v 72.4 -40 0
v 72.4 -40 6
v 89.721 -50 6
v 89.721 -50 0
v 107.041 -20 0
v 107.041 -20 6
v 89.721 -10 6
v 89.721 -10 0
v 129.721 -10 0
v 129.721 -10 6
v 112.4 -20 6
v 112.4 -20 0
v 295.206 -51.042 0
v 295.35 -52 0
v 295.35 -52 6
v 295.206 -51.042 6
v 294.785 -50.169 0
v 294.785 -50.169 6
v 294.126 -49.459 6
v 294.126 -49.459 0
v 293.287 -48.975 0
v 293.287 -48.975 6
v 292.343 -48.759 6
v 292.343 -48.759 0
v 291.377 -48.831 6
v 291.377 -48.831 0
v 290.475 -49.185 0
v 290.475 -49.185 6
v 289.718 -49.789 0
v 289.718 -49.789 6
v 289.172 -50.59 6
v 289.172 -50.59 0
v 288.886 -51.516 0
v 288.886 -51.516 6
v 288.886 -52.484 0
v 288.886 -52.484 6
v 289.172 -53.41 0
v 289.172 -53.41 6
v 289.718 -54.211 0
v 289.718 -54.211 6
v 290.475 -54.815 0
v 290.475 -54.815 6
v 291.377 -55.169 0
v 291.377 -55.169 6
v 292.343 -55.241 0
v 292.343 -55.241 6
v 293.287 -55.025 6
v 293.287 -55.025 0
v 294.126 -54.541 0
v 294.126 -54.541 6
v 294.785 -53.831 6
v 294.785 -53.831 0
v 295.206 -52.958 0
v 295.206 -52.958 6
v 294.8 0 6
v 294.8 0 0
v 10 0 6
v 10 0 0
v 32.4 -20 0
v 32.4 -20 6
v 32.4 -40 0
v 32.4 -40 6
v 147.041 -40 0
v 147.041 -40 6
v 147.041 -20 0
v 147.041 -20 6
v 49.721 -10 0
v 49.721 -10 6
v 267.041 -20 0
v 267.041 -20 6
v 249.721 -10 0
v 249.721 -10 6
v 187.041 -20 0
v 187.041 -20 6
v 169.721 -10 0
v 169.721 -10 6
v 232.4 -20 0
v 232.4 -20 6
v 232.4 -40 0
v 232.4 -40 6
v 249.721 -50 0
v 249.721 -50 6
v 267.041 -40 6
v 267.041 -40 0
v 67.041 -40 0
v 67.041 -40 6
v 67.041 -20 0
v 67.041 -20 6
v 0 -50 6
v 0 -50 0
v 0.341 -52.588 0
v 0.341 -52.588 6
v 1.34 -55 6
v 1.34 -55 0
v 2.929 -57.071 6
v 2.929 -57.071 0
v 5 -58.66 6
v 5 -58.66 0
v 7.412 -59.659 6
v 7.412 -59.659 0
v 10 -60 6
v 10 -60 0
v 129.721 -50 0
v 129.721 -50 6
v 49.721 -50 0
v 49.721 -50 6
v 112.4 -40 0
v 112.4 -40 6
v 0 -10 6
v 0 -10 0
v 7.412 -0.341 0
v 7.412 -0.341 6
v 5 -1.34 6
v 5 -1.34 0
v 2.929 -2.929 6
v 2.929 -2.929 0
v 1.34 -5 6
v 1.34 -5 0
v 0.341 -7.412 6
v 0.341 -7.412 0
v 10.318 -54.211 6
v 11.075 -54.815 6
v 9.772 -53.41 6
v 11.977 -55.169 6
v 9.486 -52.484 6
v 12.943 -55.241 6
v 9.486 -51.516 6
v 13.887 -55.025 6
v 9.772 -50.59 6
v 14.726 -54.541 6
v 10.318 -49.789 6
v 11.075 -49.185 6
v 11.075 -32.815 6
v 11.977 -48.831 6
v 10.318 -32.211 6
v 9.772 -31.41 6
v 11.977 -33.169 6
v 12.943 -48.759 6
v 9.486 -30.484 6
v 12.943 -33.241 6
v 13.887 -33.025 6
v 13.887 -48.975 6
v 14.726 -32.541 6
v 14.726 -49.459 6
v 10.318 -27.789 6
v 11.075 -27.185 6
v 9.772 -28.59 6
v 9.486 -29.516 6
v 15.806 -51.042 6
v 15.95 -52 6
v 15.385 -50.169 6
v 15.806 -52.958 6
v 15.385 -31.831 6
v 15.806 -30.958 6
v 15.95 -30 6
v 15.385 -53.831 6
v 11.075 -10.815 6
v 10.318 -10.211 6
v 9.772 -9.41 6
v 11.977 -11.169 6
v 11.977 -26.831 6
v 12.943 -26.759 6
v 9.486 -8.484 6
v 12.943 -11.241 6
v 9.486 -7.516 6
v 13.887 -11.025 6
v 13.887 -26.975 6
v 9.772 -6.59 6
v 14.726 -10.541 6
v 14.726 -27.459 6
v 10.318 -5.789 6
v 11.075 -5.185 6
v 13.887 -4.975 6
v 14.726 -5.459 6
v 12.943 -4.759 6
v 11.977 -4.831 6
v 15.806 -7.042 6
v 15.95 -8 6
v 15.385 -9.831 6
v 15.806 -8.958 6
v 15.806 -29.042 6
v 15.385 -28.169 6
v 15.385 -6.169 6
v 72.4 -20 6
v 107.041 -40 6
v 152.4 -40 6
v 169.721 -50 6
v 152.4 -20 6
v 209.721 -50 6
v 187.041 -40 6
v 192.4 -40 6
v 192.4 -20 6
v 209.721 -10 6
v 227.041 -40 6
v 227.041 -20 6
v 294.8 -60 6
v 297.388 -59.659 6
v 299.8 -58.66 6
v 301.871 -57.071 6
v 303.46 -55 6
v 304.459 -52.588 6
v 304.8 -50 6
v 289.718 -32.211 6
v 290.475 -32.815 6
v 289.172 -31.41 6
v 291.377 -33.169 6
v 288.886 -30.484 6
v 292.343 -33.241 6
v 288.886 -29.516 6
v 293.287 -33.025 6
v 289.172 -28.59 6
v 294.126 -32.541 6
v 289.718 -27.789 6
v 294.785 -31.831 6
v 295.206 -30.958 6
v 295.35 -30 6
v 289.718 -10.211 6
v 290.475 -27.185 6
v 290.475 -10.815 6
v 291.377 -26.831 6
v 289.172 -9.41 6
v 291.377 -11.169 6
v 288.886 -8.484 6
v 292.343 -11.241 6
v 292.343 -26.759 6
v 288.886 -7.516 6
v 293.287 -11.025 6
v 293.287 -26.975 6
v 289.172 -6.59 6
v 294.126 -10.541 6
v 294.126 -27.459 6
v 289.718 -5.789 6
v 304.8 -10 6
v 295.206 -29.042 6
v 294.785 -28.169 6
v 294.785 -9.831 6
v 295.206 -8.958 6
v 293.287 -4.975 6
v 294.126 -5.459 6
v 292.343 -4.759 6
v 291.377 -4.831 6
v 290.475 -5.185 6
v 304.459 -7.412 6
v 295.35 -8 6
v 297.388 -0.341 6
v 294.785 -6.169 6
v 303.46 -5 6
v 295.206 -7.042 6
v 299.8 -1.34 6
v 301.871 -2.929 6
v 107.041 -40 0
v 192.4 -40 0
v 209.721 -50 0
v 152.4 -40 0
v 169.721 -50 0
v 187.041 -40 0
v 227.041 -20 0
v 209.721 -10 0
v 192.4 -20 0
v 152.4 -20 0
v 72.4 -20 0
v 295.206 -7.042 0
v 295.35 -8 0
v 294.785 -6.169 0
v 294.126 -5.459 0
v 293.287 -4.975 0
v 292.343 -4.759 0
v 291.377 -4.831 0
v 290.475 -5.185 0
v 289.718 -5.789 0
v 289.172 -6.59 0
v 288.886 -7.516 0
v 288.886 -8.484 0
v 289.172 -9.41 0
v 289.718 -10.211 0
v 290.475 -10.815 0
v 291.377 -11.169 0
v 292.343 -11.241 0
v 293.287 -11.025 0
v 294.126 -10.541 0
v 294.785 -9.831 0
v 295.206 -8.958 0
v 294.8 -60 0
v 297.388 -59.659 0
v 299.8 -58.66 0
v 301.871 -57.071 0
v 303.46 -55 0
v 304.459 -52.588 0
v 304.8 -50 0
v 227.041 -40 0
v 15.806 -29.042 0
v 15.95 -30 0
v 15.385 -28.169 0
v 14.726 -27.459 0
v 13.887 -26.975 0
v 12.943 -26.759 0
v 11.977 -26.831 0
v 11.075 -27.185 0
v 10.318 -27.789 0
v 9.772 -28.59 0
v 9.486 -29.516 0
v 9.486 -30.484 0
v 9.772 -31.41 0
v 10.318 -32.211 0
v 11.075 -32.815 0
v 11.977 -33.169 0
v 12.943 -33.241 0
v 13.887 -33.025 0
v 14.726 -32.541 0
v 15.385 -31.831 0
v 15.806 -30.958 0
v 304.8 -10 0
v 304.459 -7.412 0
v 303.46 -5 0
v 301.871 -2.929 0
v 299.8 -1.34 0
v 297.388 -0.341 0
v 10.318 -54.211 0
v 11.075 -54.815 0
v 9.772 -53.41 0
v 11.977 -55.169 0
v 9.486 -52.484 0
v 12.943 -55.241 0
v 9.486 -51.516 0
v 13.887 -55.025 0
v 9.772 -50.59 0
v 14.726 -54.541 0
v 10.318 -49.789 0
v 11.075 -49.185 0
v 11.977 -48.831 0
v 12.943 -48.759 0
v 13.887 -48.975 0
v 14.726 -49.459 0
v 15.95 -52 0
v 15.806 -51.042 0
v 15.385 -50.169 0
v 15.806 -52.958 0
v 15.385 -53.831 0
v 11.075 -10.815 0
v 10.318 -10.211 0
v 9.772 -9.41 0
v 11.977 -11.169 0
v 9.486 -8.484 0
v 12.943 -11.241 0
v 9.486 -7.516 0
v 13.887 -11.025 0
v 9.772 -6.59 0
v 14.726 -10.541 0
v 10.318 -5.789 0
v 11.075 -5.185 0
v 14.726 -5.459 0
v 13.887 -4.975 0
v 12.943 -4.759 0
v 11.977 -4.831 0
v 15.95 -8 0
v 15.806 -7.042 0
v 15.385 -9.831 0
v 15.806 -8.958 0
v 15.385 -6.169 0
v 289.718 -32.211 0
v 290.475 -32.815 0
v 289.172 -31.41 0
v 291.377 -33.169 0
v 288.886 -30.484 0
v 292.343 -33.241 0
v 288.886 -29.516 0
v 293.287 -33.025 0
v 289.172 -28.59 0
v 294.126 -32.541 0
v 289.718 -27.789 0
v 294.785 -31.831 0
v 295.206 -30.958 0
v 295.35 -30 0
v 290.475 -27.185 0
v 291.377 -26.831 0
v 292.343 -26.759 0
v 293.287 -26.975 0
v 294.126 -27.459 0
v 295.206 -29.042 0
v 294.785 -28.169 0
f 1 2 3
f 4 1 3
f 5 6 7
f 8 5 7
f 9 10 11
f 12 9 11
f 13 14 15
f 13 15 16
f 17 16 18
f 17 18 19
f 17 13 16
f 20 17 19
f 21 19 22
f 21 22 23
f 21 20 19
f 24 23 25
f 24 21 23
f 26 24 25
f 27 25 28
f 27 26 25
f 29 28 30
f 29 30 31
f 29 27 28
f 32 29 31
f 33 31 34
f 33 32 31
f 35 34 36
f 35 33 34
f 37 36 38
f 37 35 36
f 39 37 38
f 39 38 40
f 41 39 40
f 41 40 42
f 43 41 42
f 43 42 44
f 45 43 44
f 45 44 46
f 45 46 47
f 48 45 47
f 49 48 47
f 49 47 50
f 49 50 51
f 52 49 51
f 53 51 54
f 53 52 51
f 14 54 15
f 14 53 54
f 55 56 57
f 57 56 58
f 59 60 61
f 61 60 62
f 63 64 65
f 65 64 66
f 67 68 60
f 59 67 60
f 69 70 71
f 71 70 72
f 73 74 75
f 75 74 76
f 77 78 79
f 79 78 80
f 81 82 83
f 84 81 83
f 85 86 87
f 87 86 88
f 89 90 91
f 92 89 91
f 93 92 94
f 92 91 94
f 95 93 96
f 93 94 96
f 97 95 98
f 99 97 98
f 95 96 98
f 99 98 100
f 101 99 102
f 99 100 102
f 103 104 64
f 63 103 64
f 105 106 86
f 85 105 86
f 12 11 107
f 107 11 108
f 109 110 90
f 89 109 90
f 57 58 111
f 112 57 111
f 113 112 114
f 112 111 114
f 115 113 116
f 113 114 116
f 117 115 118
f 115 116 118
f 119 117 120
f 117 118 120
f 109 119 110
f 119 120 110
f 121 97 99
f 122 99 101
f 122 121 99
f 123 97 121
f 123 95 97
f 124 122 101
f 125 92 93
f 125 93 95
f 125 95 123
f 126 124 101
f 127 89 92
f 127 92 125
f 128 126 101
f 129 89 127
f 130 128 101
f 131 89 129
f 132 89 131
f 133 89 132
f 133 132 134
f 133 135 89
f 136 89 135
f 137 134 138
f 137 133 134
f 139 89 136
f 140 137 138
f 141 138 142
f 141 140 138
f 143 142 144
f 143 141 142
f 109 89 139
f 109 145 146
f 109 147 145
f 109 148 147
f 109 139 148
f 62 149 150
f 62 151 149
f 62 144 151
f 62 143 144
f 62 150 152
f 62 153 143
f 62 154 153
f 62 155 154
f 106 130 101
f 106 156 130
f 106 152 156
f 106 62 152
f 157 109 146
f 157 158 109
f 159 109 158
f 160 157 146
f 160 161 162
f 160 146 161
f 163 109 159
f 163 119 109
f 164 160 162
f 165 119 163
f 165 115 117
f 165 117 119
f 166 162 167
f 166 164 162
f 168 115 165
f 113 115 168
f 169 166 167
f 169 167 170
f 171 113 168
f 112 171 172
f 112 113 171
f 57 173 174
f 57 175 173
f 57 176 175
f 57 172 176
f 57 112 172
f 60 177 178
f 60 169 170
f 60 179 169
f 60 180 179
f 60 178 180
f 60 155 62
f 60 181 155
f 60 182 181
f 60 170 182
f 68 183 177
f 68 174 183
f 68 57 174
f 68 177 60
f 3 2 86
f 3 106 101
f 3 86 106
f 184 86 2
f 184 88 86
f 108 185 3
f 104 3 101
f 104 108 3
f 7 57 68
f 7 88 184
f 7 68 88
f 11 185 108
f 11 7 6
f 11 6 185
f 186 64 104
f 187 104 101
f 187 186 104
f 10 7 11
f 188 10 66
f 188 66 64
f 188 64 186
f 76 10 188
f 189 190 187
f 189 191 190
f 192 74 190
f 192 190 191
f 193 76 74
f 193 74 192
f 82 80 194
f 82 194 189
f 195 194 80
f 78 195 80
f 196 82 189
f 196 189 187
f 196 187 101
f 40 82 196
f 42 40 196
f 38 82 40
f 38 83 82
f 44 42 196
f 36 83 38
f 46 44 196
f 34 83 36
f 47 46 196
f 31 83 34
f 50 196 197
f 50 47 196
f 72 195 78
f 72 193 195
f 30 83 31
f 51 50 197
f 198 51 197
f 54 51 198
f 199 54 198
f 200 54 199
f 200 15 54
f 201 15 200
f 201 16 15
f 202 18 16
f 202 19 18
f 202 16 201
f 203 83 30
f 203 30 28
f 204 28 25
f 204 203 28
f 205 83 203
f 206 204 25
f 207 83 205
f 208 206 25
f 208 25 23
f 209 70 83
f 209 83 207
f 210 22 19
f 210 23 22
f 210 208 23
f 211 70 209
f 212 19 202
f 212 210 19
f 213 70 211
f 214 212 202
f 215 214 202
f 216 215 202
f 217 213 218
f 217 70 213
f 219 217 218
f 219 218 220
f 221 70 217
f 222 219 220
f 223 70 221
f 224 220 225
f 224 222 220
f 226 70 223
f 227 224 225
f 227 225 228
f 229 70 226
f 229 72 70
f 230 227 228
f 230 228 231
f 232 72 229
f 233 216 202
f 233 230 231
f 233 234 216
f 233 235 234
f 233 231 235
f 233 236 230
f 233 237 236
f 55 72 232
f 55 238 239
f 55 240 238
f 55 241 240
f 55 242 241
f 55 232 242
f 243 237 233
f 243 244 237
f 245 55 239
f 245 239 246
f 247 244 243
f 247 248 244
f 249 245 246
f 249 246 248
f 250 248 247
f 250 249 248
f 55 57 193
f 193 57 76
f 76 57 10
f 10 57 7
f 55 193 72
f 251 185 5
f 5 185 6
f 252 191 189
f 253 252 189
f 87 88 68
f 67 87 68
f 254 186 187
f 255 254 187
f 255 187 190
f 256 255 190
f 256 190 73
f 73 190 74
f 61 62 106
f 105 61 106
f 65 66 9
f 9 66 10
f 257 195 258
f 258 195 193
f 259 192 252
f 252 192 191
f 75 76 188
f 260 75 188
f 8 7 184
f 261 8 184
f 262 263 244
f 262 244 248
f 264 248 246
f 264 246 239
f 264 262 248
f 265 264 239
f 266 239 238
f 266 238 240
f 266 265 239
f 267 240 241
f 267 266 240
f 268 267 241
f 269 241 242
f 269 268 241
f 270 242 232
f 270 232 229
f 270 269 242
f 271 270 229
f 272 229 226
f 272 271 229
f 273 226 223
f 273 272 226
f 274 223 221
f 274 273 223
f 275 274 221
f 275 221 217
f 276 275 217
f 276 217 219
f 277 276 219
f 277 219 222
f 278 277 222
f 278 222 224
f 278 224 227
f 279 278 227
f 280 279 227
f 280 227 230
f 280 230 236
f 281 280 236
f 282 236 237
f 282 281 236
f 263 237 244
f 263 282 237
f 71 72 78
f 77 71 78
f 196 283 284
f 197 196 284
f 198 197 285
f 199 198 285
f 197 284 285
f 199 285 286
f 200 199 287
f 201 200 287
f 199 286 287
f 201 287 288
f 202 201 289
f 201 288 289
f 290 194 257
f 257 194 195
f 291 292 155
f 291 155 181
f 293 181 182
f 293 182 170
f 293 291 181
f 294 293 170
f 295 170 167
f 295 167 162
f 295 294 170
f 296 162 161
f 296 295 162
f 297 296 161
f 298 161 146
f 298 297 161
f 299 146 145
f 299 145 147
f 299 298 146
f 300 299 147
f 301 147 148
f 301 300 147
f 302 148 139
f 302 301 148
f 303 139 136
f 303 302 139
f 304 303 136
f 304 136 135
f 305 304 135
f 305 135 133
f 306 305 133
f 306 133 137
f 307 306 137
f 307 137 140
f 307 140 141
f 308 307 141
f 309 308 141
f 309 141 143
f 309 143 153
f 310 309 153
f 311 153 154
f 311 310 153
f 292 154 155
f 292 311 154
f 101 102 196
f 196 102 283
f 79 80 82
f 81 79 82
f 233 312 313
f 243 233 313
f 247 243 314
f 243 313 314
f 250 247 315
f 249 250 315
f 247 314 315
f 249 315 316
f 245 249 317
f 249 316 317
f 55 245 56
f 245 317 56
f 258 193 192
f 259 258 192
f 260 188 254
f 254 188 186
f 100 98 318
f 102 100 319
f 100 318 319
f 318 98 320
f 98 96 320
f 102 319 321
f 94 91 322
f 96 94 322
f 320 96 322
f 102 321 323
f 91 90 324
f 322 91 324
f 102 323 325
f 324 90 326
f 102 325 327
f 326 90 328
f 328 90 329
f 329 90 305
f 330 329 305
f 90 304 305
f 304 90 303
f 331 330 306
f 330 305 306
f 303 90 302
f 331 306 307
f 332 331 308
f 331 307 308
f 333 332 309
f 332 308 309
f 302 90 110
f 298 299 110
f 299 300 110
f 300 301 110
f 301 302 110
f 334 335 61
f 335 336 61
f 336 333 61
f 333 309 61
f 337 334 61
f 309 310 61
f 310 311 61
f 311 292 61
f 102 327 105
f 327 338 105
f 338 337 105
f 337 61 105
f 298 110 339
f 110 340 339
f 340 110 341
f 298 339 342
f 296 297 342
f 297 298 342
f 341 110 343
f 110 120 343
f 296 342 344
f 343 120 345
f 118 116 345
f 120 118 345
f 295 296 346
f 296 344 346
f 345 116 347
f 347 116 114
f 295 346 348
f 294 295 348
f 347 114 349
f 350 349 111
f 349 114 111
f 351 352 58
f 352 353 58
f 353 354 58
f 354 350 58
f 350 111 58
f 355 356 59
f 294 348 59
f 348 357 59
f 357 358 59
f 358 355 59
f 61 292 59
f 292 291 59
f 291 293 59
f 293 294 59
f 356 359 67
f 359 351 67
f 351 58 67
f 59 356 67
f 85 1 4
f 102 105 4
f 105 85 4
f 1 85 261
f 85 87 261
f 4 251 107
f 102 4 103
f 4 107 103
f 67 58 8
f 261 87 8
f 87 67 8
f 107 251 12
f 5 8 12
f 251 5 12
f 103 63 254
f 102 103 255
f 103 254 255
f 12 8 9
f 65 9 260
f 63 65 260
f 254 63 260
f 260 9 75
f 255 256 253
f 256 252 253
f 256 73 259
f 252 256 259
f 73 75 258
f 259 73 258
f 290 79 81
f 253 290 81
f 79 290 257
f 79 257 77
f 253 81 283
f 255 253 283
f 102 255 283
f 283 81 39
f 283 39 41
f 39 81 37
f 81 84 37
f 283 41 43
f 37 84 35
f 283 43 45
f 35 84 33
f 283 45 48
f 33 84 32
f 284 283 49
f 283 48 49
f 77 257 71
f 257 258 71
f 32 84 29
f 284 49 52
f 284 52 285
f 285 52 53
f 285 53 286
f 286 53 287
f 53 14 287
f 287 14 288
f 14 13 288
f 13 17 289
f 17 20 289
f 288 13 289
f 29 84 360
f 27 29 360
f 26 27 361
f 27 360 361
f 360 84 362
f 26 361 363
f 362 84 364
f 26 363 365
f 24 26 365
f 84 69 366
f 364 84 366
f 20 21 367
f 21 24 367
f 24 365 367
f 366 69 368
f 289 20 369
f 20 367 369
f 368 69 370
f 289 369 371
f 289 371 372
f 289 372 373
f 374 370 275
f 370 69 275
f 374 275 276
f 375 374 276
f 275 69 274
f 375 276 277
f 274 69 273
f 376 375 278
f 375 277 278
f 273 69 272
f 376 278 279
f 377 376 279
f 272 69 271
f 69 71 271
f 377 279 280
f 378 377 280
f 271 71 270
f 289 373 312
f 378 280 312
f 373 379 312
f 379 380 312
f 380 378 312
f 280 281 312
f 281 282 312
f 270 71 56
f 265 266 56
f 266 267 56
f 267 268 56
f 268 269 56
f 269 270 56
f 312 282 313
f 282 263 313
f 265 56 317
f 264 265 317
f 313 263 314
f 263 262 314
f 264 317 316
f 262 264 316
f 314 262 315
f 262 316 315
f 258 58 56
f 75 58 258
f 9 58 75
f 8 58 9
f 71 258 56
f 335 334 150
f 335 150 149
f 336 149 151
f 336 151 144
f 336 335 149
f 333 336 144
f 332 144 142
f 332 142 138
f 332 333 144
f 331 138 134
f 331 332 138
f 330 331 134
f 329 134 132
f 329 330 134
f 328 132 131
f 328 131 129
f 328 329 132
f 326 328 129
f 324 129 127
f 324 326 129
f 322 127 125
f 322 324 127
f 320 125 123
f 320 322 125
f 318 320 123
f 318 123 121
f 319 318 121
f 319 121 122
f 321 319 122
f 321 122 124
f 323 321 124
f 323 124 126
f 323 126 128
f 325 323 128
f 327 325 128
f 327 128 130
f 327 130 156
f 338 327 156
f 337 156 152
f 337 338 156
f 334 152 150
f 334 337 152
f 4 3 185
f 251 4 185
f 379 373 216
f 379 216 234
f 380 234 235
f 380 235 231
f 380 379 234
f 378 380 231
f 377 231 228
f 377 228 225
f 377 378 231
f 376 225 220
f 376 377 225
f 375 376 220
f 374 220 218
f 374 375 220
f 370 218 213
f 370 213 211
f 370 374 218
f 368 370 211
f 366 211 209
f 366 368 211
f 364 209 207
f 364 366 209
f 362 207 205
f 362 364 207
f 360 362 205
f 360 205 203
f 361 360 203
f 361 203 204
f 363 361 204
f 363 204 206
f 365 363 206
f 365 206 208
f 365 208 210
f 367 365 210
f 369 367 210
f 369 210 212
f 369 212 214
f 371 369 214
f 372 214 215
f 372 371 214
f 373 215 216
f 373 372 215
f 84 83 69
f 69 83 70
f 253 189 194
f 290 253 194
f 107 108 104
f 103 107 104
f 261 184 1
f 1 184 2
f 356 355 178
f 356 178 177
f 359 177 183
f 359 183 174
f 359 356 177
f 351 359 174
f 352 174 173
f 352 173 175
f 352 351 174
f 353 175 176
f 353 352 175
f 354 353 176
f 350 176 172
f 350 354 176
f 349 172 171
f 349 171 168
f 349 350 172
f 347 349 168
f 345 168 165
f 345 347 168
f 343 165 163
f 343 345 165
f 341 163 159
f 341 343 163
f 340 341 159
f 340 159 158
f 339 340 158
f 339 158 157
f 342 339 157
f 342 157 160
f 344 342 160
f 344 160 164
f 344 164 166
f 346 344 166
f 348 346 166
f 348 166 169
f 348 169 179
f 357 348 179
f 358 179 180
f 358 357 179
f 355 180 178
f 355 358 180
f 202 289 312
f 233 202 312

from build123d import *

# Parameters (mm, degrees)
SKETCH001_R  = 3.25
PAD_DEPTH    = 6
POCKET_DEPTH = 6


with BuildPart() as part:
    # Sketch001 → Pad (new body)
    with BuildSketch(Plane.XY):
        with BuildLine():
            Line((0, -10), (0, -50))
            ThreePointArc((0, -50), (2.928932, -57.071068), (10, -60))
            Line((10, -60), (294.8, -60))
            ThreePointArc((294.8, -60), (301.871068, -57.071068), (304.8, -50))
            Line((304.8, -50), (304.8, -10))
            ThreePointArc((304.8, -10), (301.871068, -2.928932), (294.8, 0))
            Line((294.8, 0), (10, 0))
            ThreePointArc((10, 0), (2.928932, -2.928932), (0, -10))
        make_face()
        with Locations((292.1, -8)):
            Circle(SKETCH001_R, mode=Mode.SUBTRACT)
        with Locations((292.1, -52)):
            Circle(SKETCH001_R, mode=Mode.SUBTRACT)
        with Locations((292.1, -30)):
            Circle(SKETCH001_R, mode=Mode.SUBTRACT)
        with Locations((12.7, -8)):
            Circle(SKETCH001_R, mode=Mode.SUBTRACT)
        with Locations((12.7, -52)):
            Circle(SKETCH001_R, mode=Mode.SUBTRACT)
        with Locations((12.7, -30)):
            Circle(SKETCH001_R, mode=Mode.SUBTRACT)
    extrude(amount=PAD_DEPTH)

    # Sketch (on Face16 of Pad) → Pocket (cut)
    with BuildSketch(Plane.XY.offset(6)):
        Polygon((187.041016, -20), (169.720508, -10), (152.4, -20), (152.4, -40), (169.720508, -50), (187.041016, -40), align=None)
        Polygon((227.041016, -20), (209.720508, -10), (192.4, -20), (192.4, -40), (209.720508, -50), (227.041016, -40), align=None)
        Polygon((267.041016, -20), (249.720508, -10), (232.4, -20), (232.4, -40), (249.720508, -50), (267.041016, -40), align=None)
        Polygon((67.041016, -20), (49.720508, -10), (32.4, -20), (32.4, -40), (49.720508, -50), (67.041016, -40), align=None)
        Polygon((107.041016, -20), (89.720508, -10), (72.4, -20), (72.4, -40), (89.720508, -50), (107.041016, -40), align=None)
        Polygon((147.041016, -20), (129.720508, -10), (112.4, -20), (112.4, -40), (129.720508, -50), (147.041016, -40), align=None)
    extrude(amount=-POCKET_DEPTH, mode=Mode.SUBTRACT)


solid = part.part
